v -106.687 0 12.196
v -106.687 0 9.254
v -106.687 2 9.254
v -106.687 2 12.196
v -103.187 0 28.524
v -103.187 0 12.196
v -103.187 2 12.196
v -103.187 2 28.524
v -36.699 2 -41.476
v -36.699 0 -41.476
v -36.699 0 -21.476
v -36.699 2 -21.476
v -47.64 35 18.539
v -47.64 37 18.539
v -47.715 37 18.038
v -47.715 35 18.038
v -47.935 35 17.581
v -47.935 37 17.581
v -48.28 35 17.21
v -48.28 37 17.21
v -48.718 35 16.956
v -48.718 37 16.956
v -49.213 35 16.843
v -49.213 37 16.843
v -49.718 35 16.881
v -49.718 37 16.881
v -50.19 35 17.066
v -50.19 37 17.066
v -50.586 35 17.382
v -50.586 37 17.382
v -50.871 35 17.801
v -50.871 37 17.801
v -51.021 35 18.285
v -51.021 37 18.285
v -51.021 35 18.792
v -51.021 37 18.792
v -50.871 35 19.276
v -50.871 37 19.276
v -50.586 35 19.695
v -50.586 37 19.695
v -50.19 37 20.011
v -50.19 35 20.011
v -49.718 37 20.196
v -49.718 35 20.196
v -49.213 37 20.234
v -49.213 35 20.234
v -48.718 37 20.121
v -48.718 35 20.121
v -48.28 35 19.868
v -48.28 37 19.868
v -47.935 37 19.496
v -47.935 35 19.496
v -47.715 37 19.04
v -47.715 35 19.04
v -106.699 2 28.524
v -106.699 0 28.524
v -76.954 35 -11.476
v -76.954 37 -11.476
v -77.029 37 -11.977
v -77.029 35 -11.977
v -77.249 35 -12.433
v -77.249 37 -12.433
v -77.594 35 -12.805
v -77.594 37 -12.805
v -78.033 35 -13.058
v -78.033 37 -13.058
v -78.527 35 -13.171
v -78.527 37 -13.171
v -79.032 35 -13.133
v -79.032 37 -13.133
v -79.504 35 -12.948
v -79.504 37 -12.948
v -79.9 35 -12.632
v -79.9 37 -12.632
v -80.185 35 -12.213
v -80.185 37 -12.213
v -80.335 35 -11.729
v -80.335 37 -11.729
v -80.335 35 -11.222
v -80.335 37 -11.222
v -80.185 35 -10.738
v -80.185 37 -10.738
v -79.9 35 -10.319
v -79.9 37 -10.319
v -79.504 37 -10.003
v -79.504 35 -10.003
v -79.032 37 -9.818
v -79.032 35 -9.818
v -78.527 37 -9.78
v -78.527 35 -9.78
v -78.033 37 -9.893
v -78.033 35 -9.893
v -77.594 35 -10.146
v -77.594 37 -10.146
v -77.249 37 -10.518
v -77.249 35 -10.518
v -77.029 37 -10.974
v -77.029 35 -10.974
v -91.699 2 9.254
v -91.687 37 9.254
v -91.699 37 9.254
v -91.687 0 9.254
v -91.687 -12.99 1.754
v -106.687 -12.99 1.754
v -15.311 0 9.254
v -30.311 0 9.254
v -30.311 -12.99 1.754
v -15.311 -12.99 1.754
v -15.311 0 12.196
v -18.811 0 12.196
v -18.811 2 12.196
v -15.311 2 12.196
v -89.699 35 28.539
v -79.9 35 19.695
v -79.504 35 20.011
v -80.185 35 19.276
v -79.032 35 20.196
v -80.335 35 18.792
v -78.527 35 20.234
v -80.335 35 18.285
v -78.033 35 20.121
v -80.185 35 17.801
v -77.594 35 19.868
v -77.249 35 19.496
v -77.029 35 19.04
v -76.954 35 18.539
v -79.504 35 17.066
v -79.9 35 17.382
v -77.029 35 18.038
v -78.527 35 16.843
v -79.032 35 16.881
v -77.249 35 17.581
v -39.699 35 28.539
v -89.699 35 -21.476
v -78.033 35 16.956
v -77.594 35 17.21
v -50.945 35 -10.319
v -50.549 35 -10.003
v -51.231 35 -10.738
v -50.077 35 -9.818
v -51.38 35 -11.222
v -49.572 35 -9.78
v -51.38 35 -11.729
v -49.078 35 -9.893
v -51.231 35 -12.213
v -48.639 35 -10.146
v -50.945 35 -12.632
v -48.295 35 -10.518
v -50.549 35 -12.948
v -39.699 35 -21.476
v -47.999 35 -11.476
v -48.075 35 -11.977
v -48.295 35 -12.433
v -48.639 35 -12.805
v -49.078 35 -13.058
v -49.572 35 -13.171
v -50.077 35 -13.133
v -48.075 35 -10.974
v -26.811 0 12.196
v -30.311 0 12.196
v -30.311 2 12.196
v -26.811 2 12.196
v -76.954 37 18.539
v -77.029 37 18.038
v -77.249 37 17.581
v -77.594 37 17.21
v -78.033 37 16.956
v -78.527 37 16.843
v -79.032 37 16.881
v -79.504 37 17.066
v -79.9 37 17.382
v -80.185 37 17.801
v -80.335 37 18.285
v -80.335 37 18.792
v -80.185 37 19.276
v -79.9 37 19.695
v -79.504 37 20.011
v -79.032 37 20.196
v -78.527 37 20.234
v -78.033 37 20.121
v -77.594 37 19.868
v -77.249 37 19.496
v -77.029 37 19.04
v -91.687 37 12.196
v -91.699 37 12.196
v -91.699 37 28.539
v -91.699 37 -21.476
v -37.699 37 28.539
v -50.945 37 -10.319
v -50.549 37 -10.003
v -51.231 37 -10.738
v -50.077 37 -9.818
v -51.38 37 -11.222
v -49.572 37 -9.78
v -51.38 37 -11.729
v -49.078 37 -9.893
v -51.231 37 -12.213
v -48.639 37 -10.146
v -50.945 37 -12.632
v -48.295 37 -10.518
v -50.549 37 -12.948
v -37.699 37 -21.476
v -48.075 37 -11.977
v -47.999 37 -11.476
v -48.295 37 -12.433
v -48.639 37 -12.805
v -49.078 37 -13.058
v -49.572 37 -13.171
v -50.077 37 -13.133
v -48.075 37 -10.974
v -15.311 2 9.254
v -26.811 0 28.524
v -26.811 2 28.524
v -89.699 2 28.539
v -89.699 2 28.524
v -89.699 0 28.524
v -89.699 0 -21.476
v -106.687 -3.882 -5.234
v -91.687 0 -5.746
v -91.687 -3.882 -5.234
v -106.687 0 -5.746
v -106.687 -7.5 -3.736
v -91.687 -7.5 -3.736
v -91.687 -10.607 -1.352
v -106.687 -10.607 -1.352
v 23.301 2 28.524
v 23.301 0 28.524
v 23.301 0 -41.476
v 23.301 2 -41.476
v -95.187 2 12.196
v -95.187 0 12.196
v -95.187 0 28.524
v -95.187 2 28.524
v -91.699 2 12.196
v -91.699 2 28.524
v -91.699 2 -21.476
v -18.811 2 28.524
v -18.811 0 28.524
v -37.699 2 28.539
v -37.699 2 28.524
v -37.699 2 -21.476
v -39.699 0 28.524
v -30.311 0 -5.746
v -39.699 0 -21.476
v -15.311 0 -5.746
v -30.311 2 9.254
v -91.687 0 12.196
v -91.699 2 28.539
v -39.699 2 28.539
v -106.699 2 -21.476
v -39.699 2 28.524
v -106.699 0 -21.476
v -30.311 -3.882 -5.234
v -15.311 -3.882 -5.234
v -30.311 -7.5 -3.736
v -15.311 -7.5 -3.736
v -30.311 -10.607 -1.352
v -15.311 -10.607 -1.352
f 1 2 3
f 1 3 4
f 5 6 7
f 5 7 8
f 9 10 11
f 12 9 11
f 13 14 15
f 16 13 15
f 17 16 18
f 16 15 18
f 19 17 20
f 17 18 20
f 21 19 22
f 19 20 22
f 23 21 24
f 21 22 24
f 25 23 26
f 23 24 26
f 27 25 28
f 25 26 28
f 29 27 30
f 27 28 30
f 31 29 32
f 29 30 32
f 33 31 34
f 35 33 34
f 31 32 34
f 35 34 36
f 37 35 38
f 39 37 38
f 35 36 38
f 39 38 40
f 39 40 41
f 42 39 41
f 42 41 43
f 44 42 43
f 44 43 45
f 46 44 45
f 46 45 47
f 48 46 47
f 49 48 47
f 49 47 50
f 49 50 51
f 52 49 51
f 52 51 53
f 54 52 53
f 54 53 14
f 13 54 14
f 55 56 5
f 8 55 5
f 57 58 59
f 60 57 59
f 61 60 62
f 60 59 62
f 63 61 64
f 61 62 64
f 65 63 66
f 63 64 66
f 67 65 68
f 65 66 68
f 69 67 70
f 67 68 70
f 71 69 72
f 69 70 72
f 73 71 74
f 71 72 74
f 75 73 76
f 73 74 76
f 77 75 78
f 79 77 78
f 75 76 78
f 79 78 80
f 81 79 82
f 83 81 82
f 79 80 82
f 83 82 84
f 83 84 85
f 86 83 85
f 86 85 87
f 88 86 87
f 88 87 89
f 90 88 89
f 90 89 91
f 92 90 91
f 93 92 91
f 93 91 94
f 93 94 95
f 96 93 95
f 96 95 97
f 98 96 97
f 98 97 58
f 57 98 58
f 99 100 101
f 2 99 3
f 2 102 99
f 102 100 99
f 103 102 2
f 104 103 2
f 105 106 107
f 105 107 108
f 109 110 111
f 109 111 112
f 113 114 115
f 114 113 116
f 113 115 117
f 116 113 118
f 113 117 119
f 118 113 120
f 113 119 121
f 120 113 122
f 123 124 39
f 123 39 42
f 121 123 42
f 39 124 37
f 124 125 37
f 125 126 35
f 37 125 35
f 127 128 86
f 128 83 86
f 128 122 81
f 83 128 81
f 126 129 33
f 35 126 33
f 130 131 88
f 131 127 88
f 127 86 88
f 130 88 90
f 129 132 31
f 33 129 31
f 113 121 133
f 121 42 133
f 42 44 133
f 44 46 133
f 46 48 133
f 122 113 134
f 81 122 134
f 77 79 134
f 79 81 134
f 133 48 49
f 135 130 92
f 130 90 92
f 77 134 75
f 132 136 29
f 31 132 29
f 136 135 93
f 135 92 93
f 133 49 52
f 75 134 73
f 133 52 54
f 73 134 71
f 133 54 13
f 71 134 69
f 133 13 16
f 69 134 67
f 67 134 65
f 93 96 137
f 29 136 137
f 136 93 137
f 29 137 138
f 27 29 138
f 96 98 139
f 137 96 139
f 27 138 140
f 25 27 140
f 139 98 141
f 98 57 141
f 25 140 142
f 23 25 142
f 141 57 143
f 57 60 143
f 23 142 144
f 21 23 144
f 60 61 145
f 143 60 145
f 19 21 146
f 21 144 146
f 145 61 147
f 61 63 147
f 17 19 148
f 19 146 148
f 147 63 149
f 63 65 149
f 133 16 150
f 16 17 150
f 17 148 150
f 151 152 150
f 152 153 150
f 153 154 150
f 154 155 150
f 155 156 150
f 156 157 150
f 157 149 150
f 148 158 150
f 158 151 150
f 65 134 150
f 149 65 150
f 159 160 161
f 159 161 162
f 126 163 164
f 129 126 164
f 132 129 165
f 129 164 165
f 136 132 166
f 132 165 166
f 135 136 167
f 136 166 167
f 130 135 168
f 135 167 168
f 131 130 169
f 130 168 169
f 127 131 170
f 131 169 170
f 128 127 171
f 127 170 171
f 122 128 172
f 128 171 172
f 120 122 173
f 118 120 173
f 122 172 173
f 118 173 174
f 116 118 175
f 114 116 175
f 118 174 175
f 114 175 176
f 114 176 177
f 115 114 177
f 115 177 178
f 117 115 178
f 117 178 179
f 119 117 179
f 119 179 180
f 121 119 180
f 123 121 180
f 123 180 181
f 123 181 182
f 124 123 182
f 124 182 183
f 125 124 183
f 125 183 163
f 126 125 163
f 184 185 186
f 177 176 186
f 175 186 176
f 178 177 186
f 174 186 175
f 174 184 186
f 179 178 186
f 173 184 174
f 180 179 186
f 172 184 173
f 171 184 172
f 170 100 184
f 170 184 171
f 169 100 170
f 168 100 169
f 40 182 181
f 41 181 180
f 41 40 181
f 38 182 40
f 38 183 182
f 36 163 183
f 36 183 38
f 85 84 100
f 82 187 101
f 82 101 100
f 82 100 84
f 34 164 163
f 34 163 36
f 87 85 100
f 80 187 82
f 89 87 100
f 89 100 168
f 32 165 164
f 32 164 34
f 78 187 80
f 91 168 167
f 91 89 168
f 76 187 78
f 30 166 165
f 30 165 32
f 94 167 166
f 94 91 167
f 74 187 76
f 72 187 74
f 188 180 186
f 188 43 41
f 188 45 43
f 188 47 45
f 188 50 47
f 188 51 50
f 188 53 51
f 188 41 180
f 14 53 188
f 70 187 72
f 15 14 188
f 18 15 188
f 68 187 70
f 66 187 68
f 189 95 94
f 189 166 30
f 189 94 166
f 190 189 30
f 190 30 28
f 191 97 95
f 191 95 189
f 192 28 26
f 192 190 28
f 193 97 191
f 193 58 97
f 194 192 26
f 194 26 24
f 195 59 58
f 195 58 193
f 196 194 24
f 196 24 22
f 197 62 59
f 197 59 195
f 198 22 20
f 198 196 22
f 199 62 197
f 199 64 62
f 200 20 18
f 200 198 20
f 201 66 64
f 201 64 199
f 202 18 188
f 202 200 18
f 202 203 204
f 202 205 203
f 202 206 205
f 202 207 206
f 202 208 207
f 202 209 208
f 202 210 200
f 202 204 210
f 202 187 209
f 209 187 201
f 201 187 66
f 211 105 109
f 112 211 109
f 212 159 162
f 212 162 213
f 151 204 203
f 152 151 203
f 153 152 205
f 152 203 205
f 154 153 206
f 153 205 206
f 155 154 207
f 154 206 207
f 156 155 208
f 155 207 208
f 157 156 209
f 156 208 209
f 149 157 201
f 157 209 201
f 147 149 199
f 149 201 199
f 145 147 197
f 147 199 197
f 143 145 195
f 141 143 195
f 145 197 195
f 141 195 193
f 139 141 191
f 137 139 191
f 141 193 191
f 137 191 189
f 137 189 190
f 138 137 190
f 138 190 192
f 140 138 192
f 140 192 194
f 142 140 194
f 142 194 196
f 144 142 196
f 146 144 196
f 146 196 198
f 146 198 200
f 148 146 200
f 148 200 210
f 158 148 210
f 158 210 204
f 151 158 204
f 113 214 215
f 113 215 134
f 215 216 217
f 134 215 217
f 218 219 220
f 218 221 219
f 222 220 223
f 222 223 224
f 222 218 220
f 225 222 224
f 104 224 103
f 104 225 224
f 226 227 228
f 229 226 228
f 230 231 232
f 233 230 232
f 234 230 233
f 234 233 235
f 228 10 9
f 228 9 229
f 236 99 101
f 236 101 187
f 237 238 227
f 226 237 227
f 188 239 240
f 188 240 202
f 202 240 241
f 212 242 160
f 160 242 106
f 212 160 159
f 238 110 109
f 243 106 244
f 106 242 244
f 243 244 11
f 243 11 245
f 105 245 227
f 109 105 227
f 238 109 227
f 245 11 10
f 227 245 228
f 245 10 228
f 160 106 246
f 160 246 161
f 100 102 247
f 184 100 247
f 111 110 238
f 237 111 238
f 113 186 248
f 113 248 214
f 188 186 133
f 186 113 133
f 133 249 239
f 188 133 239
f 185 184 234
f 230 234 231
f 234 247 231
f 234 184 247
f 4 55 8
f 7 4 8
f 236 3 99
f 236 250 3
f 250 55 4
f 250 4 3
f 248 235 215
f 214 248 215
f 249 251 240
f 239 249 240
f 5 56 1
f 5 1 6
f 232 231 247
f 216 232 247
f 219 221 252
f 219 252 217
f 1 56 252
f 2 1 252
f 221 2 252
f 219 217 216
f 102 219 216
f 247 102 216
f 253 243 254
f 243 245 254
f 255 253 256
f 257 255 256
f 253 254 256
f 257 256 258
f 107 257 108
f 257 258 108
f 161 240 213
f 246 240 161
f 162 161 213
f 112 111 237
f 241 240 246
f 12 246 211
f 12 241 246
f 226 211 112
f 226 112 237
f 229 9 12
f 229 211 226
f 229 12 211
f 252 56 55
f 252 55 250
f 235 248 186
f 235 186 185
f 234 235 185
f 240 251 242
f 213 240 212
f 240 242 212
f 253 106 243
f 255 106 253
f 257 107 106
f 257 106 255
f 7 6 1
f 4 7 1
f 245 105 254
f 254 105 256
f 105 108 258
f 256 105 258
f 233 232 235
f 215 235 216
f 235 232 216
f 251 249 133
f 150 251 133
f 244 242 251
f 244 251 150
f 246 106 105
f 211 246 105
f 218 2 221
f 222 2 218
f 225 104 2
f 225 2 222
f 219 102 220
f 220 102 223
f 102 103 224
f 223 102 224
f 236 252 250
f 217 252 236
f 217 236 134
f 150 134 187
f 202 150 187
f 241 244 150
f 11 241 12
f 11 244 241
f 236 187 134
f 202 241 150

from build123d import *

# Parameters (mm, degrees)
SKETCH2_W                = 130
SKETCH2_H                = 70
BOSS_EXTRUDE1_DEPTH      = 2
SKETCH3_W                = 54
SKETCH3_H                = 70
BOSS_EXTRUDE2_DEPTH      = 35
SKETCH4_W                = 50
SKETCH4_H                = 70
CUT_EXTRUDE2_DEPTH       = 33
CUT_EXTRUDE2_DEPTH_BACK  = 2
SKETCH6_W                = 50
SKETCH6_H                = 2
CUT_EXTRUDE3_DEPTH       = 33
SKETCH7_W                = 70
SKETCH7_H                = 20
CUT_EXTRUDE4_DEPTH       = 40
M3_CLEARANCE_HOLE4_D     = 3.4
M3_CLEARANCE_HOLE4_DEPTH = 3.5
M3_CLEARANCE_HOLE4_TIP   = 1.021463052
SKETCH21_W               = 15
SKETCH21_H               = 15
REVOLVE1_ANGLE           = 60
SKETCH22_W               = 15
SKETCH22_H               = 2.941288486
CUT_EXTRUDE6_DEPTH       = 55
SKETCH23_W               = 8
SKETCH23_H               = 16.328711514
CUT_EXTRUDE7_DEPTH       = 55


with BuildPart() as part:
    # Sketch2 → Boss-Extrude1 (new body)
    with BuildSketch(Plane(origin=(0, 0, 0), x_dir=(1, 0, 0), z_dir=(0, 1, 0))):
        with Locations((-41.699117153, 6.475560132)):
            Rectangle(SKETCH2_W, SKETCH2_H)
    extrude(amount=BOSS_EXTRUDE1_DEPTH)

    # Sketch3 → Boss-Extrude2 (add)
    with BuildSketch(Plane(origin=(0, 2, 0), x_dir=(1, 0, 0), z_dir=(0, 1, 0))):
        with Locations((-64.699117153, 6.461257978)):
            Rectangle(SKETCH3_W, SKETCH3_H)
    extrude(amount=BOSS_EXTRUDE2_DEPTH)

    # Sketch4 → Cut-Extrude2 (cut, two sides)
    with BuildSketch(Plane(origin=(0, 2, 0), x_dir=(1, 0, 0), z_dir=(0, 1, 0))) as cut_extrude2_sk:
        with Locations((-64.699117153, 6.461257978)):
            Rectangle(SKETCH4_W, SKETCH4_H)
    extrude(amount=CUT_EXTRUDE2_DEPTH, mode=Mode.SUBTRACT)
    extrude(cut_extrude2_sk.sketch, amount=-CUT_EXTRUDE2_DEPTH_BACK, mode=Mode.SUBTRACT)

    # Sketch6 → Cut-Extrude3 (cut)
    with BuildSketch(Plane(origin=(0, 0, -41.475560132), x_dir=(-1, 0, 0), z_dir=(0, 0, -1))):
        with Locations((64.699117153, 1)):
            Rectangle(SKETCH6_W, SKETCH6_H)
    extrude(amount=-CUT_EXTRUDE3_DEPTH, mode=Mode.SUBTRACT)

    # Sketch7 → Cut-Extrude4 (cut)
    with BuildSketch(Plane.XZ):
        with Locations((-71.699117153, -31.475560132)):
            Rectangle(SKETCH7_W, SKETCH7_H)
    extrude(amount=-CUT_EXTRUDE4_DEPTH, mode=Mode.SUBTRACT)

    # M3 Clearance Hole4
    with Locations(Plane(origin=(0, 35, 0), x_dir=(-1, 0, 0), z_dir=(0, -1, 0))):
        with Locations((49.339561588, -18.538742022), (49.699117153, 11.475560132), (78.653715997, -18.538742022), (78.653715997, 11.475560132)):
            Hole(M3_CLEARANCE_HOLE4_D / 2, depth=M3_CLEARANCE_HOLE4_DEPTH)
            with Locations((0, 0, -(M3_CLEARANCE_HOLE4_DEPTH + M3_CLEARANCE_HOLE4_TIP / 2))):  # 118° drill point
                Cone(0, M3_CLEARANCE_HOLE4_D / 2, M3_CLEARANCE_HOLE4_TIP, mode=Mode.SUBTRACT)

    # Sketch21 → Revolve1 (revolve)
    with BuildSketch(Plane.XZ):
        with Locations((-22.811286853, 1.754439868)):
            Rectangle(SKETCH21_W, SKETCH21_H)
    revolve1 = revolve(axis=Axis((-30.311286853, 0, 9.254439868), (-1, 0, 0)), revolution_arc=REVOLVE1_ANGLE)

    # Sketch22 → Cut-Extrude6 (cut)
    with BuildSketch(Plane.XZ):
        with Locations((-22.811286853, 10.725084111)):
            Rectangle(SKETCH22_W, SKETCH22_H)
    cut_extrude6 = extrude(amount=-CUT_EXTRUDE6_DEPTH, mode=Mode.SUBTRACT)

    # Sketch23 → Cut-Extrude7 (cut)
    with BuildSketch(Plane.XZ):
        with Locations((-22.811286853, 20.360084111)):
            Rectangle(SKETCH23_W, SKETCH23_H)
    cut_extrude7 = extrude(amount=-CUT_EXTRUDE7_DEPTH, mode=Mode.SUBTRACT)

    # Mirror1: Revolve1 across plane
    add(revolve1.mirror(Plane.ZY.offset(60.999117153)))

    # Mirror2: Cut-Extrude6, Cut-Extrude7 across plane
    add(cut_extrude6.mirror(Plane.ZY.offset(60.999117153)), mode=Mode.SUBTRACT)
    add(cut_extrude7.mirror(Plane.ZY.offset(60.999117153)), mode=Mode.SUBTRACT)


solid = part.part
